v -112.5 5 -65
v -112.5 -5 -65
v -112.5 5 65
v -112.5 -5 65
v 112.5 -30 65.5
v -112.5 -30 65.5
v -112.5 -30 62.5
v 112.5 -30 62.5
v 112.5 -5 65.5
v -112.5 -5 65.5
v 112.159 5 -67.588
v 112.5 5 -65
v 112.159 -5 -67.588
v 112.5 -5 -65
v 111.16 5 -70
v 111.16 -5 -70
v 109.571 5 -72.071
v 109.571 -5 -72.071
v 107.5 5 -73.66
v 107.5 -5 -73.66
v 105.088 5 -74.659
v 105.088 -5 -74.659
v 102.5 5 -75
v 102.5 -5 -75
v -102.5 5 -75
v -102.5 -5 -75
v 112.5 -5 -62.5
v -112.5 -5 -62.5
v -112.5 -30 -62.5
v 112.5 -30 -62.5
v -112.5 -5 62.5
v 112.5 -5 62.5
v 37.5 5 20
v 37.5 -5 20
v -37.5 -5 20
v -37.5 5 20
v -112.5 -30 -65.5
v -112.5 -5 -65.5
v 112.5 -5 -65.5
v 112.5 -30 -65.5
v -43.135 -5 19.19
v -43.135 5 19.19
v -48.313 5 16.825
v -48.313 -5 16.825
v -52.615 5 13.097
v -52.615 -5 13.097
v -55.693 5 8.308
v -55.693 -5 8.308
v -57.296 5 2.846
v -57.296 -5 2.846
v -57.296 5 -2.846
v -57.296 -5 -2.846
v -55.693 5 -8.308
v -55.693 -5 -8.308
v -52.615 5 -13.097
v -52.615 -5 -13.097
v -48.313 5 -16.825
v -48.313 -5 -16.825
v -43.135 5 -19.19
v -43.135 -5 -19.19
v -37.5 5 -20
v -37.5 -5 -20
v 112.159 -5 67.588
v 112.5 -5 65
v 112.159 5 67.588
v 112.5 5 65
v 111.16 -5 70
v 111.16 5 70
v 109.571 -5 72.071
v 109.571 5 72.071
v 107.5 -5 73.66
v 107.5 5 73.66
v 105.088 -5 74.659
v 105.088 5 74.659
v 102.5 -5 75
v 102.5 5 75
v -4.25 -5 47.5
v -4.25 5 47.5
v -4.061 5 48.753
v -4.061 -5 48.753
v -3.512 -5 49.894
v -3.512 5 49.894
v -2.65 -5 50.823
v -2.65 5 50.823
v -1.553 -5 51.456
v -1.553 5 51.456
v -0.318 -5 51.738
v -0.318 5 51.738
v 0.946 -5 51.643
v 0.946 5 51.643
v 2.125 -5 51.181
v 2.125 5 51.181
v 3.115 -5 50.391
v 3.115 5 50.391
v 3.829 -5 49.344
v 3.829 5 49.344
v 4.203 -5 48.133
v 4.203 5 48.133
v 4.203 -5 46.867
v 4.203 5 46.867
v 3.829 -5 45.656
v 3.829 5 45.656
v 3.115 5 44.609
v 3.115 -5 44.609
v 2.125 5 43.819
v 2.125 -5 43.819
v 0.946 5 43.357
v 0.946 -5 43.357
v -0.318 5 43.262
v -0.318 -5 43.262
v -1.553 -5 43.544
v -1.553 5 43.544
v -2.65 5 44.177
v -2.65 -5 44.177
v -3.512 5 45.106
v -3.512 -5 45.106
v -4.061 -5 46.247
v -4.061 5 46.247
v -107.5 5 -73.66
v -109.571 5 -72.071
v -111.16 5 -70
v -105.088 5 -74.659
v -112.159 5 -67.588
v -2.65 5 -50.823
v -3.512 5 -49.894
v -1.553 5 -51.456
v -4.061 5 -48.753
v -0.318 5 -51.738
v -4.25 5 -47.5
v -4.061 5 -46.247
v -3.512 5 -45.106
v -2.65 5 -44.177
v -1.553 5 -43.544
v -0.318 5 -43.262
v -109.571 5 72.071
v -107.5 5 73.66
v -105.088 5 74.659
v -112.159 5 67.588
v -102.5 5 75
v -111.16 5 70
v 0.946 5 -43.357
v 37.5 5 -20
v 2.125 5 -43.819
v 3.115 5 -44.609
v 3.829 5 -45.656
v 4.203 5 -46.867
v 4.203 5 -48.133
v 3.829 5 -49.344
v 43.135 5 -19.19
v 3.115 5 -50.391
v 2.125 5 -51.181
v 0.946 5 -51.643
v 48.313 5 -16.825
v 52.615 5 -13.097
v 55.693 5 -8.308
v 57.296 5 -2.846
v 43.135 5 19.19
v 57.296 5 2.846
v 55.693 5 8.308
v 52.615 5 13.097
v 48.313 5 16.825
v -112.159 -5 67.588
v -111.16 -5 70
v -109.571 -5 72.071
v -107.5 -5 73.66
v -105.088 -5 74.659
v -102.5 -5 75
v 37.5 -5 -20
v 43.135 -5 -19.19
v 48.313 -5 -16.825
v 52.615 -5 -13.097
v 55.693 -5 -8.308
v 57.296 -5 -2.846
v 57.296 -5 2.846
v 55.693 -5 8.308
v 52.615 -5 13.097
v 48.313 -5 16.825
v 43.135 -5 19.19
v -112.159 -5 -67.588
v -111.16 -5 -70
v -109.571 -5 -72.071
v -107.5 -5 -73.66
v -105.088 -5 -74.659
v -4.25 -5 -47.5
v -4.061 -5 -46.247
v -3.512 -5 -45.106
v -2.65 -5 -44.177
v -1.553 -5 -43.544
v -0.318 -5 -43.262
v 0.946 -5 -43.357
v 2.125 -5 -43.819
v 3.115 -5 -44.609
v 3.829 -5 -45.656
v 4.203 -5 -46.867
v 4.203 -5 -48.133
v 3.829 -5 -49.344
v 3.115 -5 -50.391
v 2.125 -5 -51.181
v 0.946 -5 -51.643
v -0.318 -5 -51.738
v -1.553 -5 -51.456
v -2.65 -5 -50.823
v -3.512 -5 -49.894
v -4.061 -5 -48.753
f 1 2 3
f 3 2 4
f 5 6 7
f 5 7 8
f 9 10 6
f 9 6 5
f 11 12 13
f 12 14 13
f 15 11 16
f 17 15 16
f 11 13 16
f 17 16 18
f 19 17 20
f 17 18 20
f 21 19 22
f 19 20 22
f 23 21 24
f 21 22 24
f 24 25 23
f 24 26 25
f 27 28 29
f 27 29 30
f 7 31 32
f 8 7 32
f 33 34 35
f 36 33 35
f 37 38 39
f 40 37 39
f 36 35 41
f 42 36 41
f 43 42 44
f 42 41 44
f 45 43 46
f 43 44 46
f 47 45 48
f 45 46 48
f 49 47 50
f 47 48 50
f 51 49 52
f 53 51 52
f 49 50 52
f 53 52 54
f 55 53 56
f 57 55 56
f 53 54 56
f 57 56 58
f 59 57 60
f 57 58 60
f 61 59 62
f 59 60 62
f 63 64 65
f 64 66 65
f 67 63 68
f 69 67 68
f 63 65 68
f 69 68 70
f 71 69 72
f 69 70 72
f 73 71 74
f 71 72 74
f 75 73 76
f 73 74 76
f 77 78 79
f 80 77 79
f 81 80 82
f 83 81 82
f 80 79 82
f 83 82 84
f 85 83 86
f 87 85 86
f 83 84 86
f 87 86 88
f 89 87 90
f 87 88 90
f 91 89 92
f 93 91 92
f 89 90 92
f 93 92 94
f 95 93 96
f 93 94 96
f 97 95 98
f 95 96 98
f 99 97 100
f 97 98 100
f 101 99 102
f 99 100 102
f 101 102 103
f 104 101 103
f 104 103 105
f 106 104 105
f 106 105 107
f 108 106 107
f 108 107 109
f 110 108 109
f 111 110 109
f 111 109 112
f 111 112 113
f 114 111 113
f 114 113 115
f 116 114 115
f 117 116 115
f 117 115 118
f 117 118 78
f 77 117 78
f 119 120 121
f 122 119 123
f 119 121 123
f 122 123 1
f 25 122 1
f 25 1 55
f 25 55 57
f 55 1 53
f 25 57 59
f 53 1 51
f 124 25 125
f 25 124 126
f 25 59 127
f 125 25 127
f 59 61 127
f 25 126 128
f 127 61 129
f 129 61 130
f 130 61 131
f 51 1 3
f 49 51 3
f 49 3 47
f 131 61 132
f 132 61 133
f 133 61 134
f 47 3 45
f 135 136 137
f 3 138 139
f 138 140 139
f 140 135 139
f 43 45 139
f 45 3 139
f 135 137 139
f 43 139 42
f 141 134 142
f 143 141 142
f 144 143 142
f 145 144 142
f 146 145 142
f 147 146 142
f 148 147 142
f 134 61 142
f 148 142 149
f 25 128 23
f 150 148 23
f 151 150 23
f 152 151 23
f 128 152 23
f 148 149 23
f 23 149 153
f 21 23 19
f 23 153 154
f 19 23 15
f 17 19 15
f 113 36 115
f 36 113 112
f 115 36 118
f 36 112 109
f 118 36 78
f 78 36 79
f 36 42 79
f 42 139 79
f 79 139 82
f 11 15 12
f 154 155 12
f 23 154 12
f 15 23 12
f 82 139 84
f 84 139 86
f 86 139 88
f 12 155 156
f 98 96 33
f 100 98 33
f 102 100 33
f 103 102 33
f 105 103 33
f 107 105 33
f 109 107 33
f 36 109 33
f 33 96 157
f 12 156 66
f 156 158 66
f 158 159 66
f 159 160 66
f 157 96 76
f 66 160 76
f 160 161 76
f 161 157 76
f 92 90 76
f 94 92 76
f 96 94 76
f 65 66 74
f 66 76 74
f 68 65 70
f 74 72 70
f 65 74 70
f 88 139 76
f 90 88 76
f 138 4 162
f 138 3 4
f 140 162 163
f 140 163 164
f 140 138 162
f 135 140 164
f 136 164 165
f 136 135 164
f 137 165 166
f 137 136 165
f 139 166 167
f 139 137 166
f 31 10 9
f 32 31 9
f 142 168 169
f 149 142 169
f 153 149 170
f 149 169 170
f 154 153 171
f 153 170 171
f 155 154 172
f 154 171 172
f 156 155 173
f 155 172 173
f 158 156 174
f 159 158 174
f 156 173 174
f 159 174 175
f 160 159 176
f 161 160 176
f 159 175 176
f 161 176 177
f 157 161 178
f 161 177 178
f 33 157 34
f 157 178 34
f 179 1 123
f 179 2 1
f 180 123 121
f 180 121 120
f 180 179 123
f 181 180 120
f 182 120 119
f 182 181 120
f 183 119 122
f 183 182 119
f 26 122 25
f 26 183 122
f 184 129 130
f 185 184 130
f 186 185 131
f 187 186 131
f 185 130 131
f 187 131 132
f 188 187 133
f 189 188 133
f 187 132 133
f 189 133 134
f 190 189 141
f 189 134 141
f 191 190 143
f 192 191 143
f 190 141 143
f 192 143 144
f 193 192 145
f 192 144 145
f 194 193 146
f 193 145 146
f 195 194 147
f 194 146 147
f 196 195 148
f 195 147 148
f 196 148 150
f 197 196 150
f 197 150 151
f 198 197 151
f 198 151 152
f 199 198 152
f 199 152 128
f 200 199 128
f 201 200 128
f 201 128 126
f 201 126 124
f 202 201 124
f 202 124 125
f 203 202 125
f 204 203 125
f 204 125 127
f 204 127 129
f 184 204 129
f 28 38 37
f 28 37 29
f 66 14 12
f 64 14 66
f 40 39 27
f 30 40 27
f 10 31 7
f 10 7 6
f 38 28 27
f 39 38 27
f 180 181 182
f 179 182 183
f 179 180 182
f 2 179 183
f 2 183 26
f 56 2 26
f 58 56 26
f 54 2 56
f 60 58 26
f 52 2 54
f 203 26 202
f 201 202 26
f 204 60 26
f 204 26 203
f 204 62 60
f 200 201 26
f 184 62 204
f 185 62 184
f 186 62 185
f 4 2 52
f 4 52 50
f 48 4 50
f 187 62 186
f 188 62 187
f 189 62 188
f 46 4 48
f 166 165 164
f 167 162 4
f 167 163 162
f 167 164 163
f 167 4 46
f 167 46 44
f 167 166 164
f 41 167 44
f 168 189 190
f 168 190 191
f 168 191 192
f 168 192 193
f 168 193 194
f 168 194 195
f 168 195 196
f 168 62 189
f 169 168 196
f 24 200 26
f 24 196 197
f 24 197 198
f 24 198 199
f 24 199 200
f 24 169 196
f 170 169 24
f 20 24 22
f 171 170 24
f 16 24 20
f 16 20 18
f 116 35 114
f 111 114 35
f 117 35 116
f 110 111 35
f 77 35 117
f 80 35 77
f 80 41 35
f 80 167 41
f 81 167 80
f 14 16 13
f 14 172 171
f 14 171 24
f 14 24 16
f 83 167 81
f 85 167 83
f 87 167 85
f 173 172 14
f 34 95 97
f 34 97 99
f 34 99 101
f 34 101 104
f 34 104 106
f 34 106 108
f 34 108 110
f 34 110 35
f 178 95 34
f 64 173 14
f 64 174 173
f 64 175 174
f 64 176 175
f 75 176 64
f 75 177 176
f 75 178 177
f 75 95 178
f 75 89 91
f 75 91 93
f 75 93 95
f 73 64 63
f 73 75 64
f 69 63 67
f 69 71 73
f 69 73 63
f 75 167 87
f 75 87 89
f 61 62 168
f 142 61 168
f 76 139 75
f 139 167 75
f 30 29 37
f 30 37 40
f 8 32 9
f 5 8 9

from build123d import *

# Parameters (mm, degrees)
F0_W     = 225
F0_H     = 150
F0_R     = 20
F1_DEPTH = 5
F2_R     = 10
F4_DEPTH = 10.001
F5_W     = 225
F5_H     = 3
F6_DEPTH = 25
F8_D     = 8.5
F8_DEPTH = 24.5
F8_TIP   = 2.5536576309


with BuildPart() as f1:
    # F0 (on Front) → F1 (new body, symmetric)
    with BuildSketch(Plane.XZ):
        Rectangle(F0_W, F0_H)
        Circle(F0_R, mode=Mode.SUBTRACT)
    extrude(amount=F1_DEPTH, both=True)

    # F2
    f2_edges = [f1.edges().sort_by_distance(p)[0] for p in [
        (-112.5, 0, 75),
        (112.5, 0, 75),
        (112.5, 0, -75),
        (-112.5, 0, -75),
    ]]
    fillet(f2_edges, radius=F2_R)

    # F3 (on face) → F4 (cut, through all)
    with BuildSketch(Plane.XZ.offset(5)):
        with BuildLine():
            ThreePointArc((-37.5, 20), (-57.5, 0), (-37.5, -20))
            Line((-37.5, -20), (37.5, -20))
            ThreePointArc((37.5, -20), (57.5, 0), (37.5, 20))
            Line((37.5, 20), (-37.5, 20))
        make_face()
    extrude(amount=-F4_DEPTH, mode=Mode.SUBTRACT)

    # F8
    with Locations(Plane.XZ.offset(5)):
        with Locations((0, 47.5), (0, -47.5)):
            Hole(F8_D / 2, depth=F8_DEPTH)
            with Locations((0, 0, -(F8_DEPTH + F8_TIP / 2))):  # 118° drill point
                Cone(0, F8_D / 2, F8_TIP, mode=Mode.SUBTRACT)


with BuildPart() as f6:
    # F5 (on face) → F6 (new body)
    with BuildSketch(Plane.XZ.offset(5)):
        with Locations((0, 64)):
            Rectangle(F5_W, F5_H)
    extrude(amount=F6_DEPTH)


with BuildPart() as f6b:
    # F5 (on face) → F6, piece 2 (new body)
    with BuildSketch(Plane.XZ.offset(5)):
        with Locations((0, -64)):
            Rectangle(F5_W, F5_H)
    extrude(amount=F6_DEPTH)


solid = Compound([f1.part, f6.part, f6b.part])
